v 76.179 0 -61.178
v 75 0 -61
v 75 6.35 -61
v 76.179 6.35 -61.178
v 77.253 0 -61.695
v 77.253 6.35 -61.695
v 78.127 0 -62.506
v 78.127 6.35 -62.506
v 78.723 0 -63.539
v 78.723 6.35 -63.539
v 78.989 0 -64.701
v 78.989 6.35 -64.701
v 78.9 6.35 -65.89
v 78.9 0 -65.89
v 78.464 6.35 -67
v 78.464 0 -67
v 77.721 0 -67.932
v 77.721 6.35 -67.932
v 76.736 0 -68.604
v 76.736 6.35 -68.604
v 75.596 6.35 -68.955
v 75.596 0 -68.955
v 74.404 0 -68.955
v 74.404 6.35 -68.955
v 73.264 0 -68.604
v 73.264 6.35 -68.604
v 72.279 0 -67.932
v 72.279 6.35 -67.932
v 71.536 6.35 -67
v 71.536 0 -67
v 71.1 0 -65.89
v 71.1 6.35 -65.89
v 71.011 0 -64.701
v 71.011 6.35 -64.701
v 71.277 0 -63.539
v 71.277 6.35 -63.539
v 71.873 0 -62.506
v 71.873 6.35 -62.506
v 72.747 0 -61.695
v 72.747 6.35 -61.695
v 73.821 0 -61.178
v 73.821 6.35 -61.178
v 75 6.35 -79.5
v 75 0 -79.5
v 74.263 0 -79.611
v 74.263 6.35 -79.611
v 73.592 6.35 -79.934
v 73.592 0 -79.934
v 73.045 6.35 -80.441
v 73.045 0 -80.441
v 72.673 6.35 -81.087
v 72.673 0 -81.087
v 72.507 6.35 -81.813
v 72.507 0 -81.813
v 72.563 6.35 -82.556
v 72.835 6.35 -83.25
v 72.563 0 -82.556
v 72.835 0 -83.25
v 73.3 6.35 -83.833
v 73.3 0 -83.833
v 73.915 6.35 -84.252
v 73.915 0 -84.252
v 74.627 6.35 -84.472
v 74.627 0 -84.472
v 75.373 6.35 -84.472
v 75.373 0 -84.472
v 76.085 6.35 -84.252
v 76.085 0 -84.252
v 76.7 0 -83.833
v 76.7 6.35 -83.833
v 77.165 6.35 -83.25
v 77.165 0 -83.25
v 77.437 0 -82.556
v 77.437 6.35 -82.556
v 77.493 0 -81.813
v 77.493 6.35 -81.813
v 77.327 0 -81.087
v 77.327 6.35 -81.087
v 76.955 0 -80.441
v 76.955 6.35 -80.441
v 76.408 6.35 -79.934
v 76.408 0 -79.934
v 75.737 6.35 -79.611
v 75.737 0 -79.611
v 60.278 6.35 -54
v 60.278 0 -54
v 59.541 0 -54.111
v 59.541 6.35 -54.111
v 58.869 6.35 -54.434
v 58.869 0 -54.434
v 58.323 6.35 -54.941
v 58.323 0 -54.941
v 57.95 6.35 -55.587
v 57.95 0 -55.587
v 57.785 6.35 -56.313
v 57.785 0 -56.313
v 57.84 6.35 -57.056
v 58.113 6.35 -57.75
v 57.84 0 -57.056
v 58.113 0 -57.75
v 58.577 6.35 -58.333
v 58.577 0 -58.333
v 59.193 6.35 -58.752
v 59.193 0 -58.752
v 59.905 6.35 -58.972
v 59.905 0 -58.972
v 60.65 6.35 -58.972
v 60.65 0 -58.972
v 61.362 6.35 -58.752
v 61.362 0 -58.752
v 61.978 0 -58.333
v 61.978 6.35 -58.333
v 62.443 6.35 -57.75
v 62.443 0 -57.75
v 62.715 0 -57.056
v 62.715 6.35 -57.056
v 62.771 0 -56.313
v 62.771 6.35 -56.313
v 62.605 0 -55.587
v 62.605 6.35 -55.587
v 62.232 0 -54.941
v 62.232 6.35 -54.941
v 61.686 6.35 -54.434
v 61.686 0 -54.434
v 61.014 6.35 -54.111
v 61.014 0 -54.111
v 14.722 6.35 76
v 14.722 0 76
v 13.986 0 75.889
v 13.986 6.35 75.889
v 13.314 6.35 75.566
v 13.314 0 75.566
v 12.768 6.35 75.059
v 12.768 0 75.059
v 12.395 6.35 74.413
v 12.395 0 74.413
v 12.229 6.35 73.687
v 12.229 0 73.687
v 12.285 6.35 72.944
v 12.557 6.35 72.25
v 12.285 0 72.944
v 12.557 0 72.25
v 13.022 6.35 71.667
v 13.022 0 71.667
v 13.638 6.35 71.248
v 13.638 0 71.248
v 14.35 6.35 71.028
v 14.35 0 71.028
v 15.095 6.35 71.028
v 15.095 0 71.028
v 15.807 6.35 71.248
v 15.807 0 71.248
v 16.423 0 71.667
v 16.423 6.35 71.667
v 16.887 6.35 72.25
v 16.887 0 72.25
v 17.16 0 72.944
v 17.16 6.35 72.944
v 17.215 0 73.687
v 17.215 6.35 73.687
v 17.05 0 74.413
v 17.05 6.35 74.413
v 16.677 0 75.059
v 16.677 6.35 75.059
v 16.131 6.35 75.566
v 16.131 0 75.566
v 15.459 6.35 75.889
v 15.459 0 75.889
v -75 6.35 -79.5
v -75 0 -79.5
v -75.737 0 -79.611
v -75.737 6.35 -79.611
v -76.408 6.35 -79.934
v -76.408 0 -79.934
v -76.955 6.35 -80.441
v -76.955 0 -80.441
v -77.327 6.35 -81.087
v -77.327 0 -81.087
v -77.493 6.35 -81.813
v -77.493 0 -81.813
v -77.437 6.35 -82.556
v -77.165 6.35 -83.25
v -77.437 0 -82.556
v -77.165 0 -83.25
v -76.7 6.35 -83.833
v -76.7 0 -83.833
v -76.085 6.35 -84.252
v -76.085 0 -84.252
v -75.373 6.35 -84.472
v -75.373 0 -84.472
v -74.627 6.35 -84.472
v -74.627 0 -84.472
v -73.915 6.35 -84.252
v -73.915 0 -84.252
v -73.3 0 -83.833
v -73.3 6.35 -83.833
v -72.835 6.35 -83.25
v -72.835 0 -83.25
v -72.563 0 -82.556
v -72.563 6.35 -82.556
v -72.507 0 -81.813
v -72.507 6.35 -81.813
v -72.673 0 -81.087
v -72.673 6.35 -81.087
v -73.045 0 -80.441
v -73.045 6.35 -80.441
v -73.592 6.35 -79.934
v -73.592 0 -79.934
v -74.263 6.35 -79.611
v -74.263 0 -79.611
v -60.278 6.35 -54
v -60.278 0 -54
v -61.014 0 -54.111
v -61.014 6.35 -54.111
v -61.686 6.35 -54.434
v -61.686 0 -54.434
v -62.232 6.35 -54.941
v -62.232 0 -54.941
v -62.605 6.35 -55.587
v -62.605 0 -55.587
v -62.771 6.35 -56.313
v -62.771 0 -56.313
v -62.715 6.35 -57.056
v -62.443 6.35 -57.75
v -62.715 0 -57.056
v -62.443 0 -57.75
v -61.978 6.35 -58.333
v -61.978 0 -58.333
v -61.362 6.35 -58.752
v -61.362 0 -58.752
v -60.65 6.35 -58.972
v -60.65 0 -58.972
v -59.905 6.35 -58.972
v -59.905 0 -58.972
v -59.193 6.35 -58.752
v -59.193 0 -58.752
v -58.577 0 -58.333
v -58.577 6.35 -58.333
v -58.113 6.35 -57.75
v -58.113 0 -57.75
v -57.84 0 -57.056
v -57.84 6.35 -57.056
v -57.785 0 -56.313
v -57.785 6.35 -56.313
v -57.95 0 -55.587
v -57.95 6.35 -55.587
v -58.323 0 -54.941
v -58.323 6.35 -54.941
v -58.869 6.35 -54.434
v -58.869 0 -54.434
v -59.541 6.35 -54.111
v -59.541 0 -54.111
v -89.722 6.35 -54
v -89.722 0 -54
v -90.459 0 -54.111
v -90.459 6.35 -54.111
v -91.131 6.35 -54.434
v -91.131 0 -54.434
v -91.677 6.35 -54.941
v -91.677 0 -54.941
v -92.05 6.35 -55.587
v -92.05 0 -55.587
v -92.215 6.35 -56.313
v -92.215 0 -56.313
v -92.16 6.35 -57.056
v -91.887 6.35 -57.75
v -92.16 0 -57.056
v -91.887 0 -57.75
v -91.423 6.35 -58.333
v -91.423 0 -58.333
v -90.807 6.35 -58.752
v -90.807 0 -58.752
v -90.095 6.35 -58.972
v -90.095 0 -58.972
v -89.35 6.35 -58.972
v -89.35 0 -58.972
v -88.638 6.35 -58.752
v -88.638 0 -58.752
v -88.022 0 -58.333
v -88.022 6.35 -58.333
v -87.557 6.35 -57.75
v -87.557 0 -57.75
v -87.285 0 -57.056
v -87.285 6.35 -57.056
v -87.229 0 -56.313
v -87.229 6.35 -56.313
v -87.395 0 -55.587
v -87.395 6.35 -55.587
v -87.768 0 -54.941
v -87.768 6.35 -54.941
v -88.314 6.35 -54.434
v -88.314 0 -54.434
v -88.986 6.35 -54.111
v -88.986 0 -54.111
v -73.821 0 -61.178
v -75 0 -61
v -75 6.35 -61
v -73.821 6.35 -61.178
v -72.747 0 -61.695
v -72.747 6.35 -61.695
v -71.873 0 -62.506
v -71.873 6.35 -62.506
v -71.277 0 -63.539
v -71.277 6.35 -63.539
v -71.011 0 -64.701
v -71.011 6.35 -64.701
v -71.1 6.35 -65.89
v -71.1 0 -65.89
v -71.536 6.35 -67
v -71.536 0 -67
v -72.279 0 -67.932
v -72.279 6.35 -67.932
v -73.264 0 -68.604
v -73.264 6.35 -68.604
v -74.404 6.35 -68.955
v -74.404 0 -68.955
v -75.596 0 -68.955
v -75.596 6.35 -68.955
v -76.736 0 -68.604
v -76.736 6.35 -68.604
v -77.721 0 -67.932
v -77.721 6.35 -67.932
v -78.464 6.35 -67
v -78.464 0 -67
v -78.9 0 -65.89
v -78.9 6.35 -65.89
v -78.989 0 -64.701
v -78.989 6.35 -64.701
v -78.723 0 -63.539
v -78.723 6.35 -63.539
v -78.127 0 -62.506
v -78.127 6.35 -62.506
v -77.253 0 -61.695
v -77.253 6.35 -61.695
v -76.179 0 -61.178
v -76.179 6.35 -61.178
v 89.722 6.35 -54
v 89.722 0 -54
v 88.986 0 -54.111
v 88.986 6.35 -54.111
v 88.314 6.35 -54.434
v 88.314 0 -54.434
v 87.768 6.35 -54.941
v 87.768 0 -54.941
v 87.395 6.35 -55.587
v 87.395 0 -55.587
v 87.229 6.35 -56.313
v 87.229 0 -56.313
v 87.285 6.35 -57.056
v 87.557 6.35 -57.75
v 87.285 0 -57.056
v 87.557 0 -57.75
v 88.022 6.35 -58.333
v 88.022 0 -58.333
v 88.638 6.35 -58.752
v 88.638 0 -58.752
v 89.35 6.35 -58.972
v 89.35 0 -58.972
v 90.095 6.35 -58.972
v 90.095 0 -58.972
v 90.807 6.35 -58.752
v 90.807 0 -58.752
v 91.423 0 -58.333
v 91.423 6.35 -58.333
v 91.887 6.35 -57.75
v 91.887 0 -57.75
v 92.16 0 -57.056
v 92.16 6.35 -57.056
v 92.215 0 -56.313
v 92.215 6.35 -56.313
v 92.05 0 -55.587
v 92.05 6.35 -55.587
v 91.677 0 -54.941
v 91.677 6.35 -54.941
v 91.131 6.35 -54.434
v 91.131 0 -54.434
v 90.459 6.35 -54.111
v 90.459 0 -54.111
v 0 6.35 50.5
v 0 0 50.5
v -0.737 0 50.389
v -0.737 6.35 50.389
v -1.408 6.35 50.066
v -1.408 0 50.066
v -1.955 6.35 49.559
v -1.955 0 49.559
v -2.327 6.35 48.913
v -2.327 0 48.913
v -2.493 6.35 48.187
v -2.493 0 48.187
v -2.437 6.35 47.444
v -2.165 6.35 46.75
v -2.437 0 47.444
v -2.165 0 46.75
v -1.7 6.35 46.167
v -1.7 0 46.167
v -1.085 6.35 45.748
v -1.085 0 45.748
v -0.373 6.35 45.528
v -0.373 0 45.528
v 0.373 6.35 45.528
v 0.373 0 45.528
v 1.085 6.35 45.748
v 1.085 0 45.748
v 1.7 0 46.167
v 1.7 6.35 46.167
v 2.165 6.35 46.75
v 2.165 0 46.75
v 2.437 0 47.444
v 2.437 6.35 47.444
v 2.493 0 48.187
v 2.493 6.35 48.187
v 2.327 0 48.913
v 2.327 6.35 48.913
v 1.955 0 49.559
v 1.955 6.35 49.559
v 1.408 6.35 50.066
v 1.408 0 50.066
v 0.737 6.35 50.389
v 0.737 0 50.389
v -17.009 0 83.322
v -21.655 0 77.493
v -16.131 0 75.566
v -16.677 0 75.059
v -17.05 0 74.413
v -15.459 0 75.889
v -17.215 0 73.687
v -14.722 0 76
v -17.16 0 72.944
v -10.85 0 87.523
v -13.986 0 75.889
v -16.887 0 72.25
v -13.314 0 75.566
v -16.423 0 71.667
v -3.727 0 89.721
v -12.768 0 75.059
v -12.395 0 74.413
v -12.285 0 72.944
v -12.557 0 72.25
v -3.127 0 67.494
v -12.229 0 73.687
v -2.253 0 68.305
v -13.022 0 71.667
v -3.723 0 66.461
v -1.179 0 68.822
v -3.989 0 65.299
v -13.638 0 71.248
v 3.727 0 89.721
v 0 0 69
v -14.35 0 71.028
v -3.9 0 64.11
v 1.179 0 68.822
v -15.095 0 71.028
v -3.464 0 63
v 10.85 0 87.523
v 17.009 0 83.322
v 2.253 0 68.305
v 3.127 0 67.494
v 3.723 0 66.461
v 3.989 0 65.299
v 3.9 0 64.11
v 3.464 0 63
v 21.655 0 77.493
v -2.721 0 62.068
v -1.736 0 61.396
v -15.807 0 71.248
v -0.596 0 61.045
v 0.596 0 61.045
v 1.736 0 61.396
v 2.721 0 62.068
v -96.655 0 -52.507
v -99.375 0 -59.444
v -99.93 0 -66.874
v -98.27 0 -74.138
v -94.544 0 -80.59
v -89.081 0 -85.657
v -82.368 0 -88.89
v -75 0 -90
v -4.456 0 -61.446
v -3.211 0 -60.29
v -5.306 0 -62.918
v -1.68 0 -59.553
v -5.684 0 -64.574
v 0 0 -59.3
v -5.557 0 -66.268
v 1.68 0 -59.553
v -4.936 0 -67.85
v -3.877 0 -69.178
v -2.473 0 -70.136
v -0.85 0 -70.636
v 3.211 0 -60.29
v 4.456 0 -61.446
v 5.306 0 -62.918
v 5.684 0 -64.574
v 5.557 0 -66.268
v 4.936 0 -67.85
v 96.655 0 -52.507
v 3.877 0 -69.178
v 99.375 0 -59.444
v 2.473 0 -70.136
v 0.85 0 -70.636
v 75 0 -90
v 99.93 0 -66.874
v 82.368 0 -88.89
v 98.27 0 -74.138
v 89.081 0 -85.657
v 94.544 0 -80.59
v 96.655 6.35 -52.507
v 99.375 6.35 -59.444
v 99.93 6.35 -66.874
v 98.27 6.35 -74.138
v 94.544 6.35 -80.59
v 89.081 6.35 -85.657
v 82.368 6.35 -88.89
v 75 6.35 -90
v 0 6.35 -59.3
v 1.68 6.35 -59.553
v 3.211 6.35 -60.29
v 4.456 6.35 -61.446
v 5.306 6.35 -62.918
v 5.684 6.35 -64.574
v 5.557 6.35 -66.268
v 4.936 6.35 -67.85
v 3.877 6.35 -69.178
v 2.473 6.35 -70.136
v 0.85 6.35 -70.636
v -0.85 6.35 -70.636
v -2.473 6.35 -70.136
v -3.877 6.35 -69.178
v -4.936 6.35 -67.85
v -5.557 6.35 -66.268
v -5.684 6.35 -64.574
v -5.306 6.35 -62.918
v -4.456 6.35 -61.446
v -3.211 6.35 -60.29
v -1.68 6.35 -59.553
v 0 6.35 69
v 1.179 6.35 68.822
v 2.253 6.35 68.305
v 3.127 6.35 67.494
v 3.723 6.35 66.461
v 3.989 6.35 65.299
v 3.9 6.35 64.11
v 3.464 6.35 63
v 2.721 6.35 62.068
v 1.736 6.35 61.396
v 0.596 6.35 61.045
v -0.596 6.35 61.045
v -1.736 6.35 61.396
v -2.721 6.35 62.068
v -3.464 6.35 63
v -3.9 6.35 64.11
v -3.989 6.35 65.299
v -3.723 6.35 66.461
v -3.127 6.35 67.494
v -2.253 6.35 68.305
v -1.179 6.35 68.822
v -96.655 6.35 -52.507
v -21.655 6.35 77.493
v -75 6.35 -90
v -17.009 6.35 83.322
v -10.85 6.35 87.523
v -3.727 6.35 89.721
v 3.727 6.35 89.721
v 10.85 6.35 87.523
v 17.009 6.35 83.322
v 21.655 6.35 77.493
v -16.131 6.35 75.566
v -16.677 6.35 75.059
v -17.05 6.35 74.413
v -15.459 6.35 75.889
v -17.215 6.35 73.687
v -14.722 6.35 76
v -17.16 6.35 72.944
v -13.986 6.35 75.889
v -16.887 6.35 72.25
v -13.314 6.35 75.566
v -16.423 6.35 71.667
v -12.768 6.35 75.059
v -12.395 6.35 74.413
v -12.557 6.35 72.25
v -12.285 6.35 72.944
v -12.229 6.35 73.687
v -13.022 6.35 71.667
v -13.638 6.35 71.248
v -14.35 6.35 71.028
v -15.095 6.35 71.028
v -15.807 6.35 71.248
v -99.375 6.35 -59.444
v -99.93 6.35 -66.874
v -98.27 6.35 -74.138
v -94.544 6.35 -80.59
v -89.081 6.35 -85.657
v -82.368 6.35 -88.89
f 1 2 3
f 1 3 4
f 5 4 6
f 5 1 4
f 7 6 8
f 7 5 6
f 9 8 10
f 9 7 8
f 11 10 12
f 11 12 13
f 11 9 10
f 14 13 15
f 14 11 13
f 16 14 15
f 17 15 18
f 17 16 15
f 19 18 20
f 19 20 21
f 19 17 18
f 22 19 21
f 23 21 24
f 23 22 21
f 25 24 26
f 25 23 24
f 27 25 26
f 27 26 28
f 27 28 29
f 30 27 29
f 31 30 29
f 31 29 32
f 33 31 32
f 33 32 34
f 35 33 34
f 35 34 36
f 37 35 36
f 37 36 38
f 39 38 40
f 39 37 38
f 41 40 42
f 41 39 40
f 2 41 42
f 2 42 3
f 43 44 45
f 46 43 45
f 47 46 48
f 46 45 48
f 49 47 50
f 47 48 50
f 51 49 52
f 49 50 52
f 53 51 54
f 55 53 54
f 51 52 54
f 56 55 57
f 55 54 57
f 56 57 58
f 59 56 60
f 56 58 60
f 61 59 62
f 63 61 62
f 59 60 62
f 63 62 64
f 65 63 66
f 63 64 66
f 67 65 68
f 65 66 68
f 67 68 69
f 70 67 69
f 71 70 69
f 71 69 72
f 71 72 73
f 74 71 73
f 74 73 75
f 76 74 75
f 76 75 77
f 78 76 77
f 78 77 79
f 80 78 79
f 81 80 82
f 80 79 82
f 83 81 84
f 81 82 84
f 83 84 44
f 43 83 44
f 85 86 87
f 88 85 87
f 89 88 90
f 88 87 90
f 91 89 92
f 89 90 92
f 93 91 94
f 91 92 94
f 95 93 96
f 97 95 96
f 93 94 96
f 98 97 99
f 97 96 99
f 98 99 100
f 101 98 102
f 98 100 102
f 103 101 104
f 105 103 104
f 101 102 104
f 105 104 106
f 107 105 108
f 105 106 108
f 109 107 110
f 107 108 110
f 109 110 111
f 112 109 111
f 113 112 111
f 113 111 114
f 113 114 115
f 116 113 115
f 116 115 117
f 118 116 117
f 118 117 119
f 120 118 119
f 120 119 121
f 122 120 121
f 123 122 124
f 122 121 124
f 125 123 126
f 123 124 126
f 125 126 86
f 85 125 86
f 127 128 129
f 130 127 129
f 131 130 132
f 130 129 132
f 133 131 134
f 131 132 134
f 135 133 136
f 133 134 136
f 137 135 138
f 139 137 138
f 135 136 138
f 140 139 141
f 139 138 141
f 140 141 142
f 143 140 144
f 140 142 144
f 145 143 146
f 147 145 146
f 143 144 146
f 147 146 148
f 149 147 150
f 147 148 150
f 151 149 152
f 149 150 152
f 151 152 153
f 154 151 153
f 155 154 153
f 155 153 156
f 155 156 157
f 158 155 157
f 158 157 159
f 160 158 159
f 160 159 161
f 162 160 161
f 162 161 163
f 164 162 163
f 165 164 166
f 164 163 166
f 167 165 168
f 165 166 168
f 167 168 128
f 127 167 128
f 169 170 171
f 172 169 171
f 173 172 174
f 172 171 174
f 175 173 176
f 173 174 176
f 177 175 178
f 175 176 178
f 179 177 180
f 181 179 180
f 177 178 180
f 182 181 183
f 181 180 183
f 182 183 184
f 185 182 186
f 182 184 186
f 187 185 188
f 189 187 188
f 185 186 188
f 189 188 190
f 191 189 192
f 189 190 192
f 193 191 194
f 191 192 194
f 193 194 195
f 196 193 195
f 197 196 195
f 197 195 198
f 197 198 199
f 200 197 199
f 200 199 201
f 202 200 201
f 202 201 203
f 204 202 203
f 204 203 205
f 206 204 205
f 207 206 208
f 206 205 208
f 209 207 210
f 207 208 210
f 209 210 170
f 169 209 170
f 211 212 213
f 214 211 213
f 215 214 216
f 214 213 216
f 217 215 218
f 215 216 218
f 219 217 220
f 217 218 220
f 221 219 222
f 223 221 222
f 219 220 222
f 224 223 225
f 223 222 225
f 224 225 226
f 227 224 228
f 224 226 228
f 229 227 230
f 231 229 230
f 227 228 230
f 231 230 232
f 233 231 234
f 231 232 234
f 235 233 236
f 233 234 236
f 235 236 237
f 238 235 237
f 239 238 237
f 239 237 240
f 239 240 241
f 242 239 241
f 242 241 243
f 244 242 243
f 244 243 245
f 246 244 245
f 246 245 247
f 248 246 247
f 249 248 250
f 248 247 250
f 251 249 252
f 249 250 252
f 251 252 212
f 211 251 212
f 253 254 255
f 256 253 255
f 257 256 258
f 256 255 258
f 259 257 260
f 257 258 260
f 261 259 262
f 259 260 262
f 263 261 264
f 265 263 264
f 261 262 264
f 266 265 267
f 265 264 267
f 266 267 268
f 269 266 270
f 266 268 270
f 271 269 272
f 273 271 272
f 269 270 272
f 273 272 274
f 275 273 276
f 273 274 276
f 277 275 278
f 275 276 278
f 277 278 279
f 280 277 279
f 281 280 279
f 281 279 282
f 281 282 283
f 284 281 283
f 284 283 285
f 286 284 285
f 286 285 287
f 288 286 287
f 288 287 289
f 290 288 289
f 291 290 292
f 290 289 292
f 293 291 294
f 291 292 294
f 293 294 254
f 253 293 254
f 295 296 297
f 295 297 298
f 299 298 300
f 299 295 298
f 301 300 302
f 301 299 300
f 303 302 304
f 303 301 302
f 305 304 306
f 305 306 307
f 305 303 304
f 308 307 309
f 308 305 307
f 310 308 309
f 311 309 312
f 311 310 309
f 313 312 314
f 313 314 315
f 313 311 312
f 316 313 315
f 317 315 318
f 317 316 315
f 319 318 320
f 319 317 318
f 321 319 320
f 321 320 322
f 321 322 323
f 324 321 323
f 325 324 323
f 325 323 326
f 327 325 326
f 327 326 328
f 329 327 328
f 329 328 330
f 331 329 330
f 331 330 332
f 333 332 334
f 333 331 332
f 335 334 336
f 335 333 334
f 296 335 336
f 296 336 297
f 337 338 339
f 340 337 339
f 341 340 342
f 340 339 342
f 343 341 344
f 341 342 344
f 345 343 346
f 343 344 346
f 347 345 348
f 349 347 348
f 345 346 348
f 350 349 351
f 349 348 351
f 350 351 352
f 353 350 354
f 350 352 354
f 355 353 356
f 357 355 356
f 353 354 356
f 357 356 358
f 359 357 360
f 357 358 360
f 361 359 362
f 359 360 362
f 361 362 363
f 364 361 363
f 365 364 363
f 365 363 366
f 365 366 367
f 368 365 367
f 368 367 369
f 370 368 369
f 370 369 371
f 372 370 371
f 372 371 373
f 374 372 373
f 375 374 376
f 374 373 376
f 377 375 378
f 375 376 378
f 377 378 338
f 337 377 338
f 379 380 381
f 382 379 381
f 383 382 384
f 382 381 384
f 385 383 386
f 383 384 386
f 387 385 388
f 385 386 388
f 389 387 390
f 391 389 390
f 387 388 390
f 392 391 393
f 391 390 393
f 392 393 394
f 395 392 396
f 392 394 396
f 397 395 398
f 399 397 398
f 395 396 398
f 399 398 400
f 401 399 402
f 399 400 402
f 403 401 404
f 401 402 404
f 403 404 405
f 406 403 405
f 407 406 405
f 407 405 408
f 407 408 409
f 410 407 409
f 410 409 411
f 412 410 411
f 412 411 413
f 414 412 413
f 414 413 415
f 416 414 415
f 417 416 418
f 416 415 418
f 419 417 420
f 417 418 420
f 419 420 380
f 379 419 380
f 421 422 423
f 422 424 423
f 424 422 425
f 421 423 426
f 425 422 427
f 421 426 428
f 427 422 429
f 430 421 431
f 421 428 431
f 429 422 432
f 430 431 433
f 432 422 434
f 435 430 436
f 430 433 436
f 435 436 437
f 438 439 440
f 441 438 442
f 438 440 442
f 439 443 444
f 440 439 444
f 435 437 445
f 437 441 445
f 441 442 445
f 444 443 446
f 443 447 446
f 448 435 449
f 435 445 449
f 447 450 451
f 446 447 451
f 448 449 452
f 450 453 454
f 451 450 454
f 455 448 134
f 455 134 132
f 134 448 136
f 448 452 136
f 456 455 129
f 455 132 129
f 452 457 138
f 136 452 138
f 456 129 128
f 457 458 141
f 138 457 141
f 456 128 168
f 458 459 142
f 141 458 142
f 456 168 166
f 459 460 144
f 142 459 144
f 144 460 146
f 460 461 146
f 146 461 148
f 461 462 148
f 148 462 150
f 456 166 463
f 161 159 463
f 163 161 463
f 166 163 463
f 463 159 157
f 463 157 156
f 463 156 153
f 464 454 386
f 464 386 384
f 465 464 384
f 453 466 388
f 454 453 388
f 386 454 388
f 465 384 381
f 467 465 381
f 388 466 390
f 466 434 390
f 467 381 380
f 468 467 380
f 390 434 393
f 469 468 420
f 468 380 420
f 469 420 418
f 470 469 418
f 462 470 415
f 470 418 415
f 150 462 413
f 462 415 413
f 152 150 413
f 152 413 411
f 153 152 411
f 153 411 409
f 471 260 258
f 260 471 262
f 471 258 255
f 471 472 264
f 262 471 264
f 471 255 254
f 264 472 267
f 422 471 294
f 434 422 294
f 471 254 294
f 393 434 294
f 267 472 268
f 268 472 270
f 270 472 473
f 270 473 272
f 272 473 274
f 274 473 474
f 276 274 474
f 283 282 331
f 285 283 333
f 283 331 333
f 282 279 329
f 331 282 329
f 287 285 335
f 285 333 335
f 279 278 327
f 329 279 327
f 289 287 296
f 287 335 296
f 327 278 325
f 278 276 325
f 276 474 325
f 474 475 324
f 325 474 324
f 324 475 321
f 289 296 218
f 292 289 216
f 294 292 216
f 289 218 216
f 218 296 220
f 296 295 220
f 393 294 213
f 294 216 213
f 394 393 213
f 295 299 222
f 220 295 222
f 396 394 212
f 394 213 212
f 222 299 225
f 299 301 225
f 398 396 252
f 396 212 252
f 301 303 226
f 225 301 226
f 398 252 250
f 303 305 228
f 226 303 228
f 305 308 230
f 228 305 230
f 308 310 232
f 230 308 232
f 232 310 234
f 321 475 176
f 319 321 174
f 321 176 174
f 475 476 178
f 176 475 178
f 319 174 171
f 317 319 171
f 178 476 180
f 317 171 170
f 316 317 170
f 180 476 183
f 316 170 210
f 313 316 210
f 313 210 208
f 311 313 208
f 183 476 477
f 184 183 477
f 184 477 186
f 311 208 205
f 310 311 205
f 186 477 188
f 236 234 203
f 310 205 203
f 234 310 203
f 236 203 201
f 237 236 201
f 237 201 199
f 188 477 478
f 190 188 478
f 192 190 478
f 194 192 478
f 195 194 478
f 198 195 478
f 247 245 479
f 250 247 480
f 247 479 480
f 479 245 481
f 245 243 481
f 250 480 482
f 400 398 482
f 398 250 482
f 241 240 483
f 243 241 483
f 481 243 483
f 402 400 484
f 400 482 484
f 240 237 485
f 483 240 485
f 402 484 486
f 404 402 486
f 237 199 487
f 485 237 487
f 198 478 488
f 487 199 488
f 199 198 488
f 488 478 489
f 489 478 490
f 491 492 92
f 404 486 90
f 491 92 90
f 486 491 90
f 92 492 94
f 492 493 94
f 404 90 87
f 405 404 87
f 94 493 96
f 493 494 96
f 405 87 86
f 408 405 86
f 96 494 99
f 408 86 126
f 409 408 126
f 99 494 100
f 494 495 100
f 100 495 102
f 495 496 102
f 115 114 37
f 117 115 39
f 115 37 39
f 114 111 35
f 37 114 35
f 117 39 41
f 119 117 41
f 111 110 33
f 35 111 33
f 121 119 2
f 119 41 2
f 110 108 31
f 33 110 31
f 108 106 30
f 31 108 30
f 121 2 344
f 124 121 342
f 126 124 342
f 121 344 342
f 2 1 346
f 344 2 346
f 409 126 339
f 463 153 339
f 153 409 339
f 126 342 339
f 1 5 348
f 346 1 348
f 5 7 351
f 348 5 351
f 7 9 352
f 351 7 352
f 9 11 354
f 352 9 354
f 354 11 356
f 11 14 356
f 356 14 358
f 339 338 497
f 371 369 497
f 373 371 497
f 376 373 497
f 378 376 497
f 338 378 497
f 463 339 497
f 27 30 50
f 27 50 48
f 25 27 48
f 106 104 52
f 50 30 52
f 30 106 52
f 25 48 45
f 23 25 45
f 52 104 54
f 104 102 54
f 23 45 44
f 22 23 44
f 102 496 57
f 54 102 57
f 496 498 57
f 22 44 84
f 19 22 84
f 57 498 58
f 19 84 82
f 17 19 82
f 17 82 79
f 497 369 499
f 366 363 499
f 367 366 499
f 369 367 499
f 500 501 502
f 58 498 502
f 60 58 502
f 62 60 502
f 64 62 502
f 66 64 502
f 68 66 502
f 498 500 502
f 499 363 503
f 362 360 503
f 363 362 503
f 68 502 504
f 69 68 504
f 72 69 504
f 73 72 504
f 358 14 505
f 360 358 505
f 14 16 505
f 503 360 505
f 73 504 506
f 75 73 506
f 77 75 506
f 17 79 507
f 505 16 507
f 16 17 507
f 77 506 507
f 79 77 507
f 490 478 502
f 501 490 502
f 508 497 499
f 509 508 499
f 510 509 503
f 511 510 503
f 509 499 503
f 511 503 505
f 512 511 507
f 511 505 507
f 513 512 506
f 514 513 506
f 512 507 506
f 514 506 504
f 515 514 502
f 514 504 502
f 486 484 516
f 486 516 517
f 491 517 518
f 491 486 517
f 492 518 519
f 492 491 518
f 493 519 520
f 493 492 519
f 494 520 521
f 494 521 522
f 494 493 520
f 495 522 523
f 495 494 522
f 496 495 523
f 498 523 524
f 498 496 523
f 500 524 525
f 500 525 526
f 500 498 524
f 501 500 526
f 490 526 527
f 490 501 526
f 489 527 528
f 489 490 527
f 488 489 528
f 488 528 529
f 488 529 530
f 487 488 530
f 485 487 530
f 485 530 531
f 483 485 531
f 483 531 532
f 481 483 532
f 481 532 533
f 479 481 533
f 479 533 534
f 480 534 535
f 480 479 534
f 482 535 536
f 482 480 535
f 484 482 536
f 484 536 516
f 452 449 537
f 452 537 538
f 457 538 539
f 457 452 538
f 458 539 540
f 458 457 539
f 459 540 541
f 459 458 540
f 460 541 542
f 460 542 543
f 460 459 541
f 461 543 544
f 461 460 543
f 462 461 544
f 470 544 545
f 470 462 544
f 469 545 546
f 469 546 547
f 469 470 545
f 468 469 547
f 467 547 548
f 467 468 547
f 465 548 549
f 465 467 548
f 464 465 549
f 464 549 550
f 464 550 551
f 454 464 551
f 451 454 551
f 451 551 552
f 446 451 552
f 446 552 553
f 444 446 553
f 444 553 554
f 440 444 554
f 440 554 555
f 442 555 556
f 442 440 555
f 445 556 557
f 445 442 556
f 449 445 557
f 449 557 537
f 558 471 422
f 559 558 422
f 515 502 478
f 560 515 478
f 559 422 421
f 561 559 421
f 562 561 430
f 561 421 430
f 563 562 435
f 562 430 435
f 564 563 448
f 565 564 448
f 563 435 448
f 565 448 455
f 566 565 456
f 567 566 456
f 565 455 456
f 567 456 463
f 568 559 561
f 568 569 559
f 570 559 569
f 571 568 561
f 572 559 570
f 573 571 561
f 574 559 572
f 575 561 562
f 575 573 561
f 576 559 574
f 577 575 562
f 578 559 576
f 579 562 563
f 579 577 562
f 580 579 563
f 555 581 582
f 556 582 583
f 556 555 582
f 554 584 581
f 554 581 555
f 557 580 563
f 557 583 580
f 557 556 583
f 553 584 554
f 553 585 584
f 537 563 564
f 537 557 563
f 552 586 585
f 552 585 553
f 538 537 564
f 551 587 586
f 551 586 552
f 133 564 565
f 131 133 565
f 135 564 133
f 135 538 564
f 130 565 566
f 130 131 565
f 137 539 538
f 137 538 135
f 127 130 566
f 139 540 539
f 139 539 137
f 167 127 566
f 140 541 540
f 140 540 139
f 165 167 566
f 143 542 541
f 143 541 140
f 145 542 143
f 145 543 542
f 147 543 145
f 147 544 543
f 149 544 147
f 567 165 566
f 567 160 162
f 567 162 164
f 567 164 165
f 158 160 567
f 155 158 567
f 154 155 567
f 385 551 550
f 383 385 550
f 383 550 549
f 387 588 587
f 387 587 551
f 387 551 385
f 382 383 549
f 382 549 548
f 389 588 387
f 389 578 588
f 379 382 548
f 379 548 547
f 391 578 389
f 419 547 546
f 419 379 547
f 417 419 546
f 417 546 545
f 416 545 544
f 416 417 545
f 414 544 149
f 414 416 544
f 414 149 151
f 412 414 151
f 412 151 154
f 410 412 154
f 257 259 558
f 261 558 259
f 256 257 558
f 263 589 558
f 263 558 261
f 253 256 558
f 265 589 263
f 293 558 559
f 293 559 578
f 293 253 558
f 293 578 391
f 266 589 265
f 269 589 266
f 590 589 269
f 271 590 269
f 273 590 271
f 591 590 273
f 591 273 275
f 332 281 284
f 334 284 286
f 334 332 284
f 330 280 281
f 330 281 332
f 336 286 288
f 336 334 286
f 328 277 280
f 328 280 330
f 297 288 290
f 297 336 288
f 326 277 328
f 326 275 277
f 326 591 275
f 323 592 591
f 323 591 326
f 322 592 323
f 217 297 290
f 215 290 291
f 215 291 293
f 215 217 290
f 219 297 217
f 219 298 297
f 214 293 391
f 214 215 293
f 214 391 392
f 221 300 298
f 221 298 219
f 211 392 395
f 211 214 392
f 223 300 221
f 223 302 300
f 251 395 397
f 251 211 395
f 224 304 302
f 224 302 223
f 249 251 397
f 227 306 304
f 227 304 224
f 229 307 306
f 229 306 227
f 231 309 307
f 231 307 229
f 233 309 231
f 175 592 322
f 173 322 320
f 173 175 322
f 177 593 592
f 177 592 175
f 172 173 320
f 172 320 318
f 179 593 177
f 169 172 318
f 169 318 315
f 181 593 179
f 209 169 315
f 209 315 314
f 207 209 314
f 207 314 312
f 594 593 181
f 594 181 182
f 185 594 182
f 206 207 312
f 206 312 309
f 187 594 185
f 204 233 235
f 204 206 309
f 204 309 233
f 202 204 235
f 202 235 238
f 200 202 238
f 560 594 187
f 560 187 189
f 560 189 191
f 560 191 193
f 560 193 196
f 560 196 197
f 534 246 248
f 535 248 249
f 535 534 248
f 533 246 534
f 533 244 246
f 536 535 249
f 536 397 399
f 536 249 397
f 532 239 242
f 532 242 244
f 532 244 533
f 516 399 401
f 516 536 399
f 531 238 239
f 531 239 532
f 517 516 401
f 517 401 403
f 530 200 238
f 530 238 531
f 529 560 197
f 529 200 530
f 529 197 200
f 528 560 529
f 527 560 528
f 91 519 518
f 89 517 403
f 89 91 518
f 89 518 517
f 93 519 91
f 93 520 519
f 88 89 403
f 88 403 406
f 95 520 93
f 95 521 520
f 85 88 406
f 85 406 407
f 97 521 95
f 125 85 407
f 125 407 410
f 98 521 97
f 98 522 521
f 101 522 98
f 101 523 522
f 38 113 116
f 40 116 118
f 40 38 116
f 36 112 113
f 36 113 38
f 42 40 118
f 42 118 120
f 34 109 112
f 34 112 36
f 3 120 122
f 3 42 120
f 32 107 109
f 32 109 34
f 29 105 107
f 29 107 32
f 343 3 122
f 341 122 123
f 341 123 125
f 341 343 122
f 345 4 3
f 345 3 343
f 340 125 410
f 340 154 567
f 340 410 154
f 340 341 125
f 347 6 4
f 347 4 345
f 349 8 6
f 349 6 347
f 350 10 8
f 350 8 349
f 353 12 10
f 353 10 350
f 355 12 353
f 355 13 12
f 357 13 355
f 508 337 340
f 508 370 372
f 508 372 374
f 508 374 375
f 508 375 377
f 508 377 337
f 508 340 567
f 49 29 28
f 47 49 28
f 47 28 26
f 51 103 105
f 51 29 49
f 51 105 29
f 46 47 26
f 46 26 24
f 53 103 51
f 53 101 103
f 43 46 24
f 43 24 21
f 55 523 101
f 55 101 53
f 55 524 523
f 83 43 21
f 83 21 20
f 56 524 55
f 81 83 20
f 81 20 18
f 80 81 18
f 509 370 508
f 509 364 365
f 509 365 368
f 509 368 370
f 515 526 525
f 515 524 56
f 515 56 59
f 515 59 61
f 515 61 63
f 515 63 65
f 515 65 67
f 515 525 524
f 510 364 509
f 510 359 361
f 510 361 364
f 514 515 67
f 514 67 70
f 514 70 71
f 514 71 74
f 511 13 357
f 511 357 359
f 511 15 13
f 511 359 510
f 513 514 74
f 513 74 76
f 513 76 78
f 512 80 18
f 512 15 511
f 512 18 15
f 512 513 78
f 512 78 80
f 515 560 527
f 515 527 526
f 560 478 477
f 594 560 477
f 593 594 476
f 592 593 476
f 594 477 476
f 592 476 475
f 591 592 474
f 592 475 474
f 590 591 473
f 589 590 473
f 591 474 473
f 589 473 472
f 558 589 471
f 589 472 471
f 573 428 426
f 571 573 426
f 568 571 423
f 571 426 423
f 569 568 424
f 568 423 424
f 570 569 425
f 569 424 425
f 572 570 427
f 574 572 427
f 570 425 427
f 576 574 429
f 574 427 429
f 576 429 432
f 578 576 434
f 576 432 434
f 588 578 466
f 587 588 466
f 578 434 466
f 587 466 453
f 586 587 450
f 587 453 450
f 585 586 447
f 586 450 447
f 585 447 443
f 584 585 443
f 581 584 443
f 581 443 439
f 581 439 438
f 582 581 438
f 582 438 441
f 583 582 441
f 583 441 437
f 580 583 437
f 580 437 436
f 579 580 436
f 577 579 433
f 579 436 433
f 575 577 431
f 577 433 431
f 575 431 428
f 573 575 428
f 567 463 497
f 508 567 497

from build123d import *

# Parameters (mm, degrees)
ESQUISSE1_R             = 5.7
ESQUISSE1_R_2           = 4
BOSS_EXTRU_1_DEPTH      = 6.35
ESQUISSE4_R             = 2.5
ENL_V_MAT_EXTRU_1_DEPTH = 6.35


with BuildPart() as part:
    # Esquisse1 → Boss.-Extru.1 (new body)
    with BuildSketch(Plane(origin=(0, 0, 0), x_dir=(1, 0, 0), z_dir=(0, 1, 0))):
        with BuildLine():
            Line((-96.654639651, 52.506938663), (-21.654639651, -77.493061337))
            ThreePointArc((-21.654639651, -77.493061337), (0, -90), (21.654639651, -77.493061337))
            Line((21.654639651, -77.493061337), (96.654639651, 52.506938663))
            ThreePointArc((96.654639651, 52.506938663), (96.648631983, 77.50346885), (75, 90))
            Line((75, 90), (-75, 90))
            ThreePointArc((-75, 90), (-96.648631983, 77.50346885), (-96.654639651, 52.506938663))
        make_face()
        with Locations(Location((0, 65, 0), (0, 0, 270))):
            Circle(ESQUISSE1_R, mode=Mode.SUBTRACT)
        with Locations(Location((-75, 65, 0), (0, 0, 270))):
            Circle(ESQUISSE1_R_2, mode=Mode.SUBTRACT)
        with Locations(Location((75, 65, 0), (0, 0, 270))):
            Circle(ESQUISSE1_R_2, mode=Mode.SUBTRACT)
        with Locations(Location((0, -65, 0), (0, 0, 270))):
            Circle(ESQUISSE1_R_2, mode=Mode.SUBTRACT)
    extrude(amount=BOSS_EXTRU_1_DEPTH)

    # Esquisse4 → Enlèv. mat.-Extru.1 (cut)
    with BuildSketch(Plane.XZ):
        with Locations(Location((-75, -82, 0), (0, 0, 90))):
            Circle(ESQUISSE4_R)
        with Locations(Location((-89.722431864, -56.5, 0), (0, 0, 90))):
            Circle(ESQUISSE4_R)
        with Locations(Location((-60.277568136, -56.5, 0), (0, 0, 90))):
            Circle(ESQUISSE4_R)
        with Locations(Location((60.277568136, -56.5, 0), (0, 0, 90))):
            Circle(ESQUISSE4_R)
        with Locations(Location((75, -82, 0), (0, 0, 90))):
            Circle(ESQUISSE4_R)
        with Locations(Location((89.722431864, -56.5, 0), (0, 0, 90))):
            Circle(ESQUISSE4_R)
        with Locations(Location((-14.722431864, 73.5, 0), (0, 0, 90))):
            Circle(ESQUISSE4_R)
        with Locations(Location((0, 48, 0), (0, 0, 90))):
            Circle(ESQUISSE4_R)
        with Locations(Location((14.722431864, 73.5, 0), (0, 0, 90))):
            Circle(ESQUISSE4_R)
    extrude(amount=-ENL_V_MAT_EXTRU_1_DEPTH, mode=Mode.SUBTRACT)


solid = part.part
